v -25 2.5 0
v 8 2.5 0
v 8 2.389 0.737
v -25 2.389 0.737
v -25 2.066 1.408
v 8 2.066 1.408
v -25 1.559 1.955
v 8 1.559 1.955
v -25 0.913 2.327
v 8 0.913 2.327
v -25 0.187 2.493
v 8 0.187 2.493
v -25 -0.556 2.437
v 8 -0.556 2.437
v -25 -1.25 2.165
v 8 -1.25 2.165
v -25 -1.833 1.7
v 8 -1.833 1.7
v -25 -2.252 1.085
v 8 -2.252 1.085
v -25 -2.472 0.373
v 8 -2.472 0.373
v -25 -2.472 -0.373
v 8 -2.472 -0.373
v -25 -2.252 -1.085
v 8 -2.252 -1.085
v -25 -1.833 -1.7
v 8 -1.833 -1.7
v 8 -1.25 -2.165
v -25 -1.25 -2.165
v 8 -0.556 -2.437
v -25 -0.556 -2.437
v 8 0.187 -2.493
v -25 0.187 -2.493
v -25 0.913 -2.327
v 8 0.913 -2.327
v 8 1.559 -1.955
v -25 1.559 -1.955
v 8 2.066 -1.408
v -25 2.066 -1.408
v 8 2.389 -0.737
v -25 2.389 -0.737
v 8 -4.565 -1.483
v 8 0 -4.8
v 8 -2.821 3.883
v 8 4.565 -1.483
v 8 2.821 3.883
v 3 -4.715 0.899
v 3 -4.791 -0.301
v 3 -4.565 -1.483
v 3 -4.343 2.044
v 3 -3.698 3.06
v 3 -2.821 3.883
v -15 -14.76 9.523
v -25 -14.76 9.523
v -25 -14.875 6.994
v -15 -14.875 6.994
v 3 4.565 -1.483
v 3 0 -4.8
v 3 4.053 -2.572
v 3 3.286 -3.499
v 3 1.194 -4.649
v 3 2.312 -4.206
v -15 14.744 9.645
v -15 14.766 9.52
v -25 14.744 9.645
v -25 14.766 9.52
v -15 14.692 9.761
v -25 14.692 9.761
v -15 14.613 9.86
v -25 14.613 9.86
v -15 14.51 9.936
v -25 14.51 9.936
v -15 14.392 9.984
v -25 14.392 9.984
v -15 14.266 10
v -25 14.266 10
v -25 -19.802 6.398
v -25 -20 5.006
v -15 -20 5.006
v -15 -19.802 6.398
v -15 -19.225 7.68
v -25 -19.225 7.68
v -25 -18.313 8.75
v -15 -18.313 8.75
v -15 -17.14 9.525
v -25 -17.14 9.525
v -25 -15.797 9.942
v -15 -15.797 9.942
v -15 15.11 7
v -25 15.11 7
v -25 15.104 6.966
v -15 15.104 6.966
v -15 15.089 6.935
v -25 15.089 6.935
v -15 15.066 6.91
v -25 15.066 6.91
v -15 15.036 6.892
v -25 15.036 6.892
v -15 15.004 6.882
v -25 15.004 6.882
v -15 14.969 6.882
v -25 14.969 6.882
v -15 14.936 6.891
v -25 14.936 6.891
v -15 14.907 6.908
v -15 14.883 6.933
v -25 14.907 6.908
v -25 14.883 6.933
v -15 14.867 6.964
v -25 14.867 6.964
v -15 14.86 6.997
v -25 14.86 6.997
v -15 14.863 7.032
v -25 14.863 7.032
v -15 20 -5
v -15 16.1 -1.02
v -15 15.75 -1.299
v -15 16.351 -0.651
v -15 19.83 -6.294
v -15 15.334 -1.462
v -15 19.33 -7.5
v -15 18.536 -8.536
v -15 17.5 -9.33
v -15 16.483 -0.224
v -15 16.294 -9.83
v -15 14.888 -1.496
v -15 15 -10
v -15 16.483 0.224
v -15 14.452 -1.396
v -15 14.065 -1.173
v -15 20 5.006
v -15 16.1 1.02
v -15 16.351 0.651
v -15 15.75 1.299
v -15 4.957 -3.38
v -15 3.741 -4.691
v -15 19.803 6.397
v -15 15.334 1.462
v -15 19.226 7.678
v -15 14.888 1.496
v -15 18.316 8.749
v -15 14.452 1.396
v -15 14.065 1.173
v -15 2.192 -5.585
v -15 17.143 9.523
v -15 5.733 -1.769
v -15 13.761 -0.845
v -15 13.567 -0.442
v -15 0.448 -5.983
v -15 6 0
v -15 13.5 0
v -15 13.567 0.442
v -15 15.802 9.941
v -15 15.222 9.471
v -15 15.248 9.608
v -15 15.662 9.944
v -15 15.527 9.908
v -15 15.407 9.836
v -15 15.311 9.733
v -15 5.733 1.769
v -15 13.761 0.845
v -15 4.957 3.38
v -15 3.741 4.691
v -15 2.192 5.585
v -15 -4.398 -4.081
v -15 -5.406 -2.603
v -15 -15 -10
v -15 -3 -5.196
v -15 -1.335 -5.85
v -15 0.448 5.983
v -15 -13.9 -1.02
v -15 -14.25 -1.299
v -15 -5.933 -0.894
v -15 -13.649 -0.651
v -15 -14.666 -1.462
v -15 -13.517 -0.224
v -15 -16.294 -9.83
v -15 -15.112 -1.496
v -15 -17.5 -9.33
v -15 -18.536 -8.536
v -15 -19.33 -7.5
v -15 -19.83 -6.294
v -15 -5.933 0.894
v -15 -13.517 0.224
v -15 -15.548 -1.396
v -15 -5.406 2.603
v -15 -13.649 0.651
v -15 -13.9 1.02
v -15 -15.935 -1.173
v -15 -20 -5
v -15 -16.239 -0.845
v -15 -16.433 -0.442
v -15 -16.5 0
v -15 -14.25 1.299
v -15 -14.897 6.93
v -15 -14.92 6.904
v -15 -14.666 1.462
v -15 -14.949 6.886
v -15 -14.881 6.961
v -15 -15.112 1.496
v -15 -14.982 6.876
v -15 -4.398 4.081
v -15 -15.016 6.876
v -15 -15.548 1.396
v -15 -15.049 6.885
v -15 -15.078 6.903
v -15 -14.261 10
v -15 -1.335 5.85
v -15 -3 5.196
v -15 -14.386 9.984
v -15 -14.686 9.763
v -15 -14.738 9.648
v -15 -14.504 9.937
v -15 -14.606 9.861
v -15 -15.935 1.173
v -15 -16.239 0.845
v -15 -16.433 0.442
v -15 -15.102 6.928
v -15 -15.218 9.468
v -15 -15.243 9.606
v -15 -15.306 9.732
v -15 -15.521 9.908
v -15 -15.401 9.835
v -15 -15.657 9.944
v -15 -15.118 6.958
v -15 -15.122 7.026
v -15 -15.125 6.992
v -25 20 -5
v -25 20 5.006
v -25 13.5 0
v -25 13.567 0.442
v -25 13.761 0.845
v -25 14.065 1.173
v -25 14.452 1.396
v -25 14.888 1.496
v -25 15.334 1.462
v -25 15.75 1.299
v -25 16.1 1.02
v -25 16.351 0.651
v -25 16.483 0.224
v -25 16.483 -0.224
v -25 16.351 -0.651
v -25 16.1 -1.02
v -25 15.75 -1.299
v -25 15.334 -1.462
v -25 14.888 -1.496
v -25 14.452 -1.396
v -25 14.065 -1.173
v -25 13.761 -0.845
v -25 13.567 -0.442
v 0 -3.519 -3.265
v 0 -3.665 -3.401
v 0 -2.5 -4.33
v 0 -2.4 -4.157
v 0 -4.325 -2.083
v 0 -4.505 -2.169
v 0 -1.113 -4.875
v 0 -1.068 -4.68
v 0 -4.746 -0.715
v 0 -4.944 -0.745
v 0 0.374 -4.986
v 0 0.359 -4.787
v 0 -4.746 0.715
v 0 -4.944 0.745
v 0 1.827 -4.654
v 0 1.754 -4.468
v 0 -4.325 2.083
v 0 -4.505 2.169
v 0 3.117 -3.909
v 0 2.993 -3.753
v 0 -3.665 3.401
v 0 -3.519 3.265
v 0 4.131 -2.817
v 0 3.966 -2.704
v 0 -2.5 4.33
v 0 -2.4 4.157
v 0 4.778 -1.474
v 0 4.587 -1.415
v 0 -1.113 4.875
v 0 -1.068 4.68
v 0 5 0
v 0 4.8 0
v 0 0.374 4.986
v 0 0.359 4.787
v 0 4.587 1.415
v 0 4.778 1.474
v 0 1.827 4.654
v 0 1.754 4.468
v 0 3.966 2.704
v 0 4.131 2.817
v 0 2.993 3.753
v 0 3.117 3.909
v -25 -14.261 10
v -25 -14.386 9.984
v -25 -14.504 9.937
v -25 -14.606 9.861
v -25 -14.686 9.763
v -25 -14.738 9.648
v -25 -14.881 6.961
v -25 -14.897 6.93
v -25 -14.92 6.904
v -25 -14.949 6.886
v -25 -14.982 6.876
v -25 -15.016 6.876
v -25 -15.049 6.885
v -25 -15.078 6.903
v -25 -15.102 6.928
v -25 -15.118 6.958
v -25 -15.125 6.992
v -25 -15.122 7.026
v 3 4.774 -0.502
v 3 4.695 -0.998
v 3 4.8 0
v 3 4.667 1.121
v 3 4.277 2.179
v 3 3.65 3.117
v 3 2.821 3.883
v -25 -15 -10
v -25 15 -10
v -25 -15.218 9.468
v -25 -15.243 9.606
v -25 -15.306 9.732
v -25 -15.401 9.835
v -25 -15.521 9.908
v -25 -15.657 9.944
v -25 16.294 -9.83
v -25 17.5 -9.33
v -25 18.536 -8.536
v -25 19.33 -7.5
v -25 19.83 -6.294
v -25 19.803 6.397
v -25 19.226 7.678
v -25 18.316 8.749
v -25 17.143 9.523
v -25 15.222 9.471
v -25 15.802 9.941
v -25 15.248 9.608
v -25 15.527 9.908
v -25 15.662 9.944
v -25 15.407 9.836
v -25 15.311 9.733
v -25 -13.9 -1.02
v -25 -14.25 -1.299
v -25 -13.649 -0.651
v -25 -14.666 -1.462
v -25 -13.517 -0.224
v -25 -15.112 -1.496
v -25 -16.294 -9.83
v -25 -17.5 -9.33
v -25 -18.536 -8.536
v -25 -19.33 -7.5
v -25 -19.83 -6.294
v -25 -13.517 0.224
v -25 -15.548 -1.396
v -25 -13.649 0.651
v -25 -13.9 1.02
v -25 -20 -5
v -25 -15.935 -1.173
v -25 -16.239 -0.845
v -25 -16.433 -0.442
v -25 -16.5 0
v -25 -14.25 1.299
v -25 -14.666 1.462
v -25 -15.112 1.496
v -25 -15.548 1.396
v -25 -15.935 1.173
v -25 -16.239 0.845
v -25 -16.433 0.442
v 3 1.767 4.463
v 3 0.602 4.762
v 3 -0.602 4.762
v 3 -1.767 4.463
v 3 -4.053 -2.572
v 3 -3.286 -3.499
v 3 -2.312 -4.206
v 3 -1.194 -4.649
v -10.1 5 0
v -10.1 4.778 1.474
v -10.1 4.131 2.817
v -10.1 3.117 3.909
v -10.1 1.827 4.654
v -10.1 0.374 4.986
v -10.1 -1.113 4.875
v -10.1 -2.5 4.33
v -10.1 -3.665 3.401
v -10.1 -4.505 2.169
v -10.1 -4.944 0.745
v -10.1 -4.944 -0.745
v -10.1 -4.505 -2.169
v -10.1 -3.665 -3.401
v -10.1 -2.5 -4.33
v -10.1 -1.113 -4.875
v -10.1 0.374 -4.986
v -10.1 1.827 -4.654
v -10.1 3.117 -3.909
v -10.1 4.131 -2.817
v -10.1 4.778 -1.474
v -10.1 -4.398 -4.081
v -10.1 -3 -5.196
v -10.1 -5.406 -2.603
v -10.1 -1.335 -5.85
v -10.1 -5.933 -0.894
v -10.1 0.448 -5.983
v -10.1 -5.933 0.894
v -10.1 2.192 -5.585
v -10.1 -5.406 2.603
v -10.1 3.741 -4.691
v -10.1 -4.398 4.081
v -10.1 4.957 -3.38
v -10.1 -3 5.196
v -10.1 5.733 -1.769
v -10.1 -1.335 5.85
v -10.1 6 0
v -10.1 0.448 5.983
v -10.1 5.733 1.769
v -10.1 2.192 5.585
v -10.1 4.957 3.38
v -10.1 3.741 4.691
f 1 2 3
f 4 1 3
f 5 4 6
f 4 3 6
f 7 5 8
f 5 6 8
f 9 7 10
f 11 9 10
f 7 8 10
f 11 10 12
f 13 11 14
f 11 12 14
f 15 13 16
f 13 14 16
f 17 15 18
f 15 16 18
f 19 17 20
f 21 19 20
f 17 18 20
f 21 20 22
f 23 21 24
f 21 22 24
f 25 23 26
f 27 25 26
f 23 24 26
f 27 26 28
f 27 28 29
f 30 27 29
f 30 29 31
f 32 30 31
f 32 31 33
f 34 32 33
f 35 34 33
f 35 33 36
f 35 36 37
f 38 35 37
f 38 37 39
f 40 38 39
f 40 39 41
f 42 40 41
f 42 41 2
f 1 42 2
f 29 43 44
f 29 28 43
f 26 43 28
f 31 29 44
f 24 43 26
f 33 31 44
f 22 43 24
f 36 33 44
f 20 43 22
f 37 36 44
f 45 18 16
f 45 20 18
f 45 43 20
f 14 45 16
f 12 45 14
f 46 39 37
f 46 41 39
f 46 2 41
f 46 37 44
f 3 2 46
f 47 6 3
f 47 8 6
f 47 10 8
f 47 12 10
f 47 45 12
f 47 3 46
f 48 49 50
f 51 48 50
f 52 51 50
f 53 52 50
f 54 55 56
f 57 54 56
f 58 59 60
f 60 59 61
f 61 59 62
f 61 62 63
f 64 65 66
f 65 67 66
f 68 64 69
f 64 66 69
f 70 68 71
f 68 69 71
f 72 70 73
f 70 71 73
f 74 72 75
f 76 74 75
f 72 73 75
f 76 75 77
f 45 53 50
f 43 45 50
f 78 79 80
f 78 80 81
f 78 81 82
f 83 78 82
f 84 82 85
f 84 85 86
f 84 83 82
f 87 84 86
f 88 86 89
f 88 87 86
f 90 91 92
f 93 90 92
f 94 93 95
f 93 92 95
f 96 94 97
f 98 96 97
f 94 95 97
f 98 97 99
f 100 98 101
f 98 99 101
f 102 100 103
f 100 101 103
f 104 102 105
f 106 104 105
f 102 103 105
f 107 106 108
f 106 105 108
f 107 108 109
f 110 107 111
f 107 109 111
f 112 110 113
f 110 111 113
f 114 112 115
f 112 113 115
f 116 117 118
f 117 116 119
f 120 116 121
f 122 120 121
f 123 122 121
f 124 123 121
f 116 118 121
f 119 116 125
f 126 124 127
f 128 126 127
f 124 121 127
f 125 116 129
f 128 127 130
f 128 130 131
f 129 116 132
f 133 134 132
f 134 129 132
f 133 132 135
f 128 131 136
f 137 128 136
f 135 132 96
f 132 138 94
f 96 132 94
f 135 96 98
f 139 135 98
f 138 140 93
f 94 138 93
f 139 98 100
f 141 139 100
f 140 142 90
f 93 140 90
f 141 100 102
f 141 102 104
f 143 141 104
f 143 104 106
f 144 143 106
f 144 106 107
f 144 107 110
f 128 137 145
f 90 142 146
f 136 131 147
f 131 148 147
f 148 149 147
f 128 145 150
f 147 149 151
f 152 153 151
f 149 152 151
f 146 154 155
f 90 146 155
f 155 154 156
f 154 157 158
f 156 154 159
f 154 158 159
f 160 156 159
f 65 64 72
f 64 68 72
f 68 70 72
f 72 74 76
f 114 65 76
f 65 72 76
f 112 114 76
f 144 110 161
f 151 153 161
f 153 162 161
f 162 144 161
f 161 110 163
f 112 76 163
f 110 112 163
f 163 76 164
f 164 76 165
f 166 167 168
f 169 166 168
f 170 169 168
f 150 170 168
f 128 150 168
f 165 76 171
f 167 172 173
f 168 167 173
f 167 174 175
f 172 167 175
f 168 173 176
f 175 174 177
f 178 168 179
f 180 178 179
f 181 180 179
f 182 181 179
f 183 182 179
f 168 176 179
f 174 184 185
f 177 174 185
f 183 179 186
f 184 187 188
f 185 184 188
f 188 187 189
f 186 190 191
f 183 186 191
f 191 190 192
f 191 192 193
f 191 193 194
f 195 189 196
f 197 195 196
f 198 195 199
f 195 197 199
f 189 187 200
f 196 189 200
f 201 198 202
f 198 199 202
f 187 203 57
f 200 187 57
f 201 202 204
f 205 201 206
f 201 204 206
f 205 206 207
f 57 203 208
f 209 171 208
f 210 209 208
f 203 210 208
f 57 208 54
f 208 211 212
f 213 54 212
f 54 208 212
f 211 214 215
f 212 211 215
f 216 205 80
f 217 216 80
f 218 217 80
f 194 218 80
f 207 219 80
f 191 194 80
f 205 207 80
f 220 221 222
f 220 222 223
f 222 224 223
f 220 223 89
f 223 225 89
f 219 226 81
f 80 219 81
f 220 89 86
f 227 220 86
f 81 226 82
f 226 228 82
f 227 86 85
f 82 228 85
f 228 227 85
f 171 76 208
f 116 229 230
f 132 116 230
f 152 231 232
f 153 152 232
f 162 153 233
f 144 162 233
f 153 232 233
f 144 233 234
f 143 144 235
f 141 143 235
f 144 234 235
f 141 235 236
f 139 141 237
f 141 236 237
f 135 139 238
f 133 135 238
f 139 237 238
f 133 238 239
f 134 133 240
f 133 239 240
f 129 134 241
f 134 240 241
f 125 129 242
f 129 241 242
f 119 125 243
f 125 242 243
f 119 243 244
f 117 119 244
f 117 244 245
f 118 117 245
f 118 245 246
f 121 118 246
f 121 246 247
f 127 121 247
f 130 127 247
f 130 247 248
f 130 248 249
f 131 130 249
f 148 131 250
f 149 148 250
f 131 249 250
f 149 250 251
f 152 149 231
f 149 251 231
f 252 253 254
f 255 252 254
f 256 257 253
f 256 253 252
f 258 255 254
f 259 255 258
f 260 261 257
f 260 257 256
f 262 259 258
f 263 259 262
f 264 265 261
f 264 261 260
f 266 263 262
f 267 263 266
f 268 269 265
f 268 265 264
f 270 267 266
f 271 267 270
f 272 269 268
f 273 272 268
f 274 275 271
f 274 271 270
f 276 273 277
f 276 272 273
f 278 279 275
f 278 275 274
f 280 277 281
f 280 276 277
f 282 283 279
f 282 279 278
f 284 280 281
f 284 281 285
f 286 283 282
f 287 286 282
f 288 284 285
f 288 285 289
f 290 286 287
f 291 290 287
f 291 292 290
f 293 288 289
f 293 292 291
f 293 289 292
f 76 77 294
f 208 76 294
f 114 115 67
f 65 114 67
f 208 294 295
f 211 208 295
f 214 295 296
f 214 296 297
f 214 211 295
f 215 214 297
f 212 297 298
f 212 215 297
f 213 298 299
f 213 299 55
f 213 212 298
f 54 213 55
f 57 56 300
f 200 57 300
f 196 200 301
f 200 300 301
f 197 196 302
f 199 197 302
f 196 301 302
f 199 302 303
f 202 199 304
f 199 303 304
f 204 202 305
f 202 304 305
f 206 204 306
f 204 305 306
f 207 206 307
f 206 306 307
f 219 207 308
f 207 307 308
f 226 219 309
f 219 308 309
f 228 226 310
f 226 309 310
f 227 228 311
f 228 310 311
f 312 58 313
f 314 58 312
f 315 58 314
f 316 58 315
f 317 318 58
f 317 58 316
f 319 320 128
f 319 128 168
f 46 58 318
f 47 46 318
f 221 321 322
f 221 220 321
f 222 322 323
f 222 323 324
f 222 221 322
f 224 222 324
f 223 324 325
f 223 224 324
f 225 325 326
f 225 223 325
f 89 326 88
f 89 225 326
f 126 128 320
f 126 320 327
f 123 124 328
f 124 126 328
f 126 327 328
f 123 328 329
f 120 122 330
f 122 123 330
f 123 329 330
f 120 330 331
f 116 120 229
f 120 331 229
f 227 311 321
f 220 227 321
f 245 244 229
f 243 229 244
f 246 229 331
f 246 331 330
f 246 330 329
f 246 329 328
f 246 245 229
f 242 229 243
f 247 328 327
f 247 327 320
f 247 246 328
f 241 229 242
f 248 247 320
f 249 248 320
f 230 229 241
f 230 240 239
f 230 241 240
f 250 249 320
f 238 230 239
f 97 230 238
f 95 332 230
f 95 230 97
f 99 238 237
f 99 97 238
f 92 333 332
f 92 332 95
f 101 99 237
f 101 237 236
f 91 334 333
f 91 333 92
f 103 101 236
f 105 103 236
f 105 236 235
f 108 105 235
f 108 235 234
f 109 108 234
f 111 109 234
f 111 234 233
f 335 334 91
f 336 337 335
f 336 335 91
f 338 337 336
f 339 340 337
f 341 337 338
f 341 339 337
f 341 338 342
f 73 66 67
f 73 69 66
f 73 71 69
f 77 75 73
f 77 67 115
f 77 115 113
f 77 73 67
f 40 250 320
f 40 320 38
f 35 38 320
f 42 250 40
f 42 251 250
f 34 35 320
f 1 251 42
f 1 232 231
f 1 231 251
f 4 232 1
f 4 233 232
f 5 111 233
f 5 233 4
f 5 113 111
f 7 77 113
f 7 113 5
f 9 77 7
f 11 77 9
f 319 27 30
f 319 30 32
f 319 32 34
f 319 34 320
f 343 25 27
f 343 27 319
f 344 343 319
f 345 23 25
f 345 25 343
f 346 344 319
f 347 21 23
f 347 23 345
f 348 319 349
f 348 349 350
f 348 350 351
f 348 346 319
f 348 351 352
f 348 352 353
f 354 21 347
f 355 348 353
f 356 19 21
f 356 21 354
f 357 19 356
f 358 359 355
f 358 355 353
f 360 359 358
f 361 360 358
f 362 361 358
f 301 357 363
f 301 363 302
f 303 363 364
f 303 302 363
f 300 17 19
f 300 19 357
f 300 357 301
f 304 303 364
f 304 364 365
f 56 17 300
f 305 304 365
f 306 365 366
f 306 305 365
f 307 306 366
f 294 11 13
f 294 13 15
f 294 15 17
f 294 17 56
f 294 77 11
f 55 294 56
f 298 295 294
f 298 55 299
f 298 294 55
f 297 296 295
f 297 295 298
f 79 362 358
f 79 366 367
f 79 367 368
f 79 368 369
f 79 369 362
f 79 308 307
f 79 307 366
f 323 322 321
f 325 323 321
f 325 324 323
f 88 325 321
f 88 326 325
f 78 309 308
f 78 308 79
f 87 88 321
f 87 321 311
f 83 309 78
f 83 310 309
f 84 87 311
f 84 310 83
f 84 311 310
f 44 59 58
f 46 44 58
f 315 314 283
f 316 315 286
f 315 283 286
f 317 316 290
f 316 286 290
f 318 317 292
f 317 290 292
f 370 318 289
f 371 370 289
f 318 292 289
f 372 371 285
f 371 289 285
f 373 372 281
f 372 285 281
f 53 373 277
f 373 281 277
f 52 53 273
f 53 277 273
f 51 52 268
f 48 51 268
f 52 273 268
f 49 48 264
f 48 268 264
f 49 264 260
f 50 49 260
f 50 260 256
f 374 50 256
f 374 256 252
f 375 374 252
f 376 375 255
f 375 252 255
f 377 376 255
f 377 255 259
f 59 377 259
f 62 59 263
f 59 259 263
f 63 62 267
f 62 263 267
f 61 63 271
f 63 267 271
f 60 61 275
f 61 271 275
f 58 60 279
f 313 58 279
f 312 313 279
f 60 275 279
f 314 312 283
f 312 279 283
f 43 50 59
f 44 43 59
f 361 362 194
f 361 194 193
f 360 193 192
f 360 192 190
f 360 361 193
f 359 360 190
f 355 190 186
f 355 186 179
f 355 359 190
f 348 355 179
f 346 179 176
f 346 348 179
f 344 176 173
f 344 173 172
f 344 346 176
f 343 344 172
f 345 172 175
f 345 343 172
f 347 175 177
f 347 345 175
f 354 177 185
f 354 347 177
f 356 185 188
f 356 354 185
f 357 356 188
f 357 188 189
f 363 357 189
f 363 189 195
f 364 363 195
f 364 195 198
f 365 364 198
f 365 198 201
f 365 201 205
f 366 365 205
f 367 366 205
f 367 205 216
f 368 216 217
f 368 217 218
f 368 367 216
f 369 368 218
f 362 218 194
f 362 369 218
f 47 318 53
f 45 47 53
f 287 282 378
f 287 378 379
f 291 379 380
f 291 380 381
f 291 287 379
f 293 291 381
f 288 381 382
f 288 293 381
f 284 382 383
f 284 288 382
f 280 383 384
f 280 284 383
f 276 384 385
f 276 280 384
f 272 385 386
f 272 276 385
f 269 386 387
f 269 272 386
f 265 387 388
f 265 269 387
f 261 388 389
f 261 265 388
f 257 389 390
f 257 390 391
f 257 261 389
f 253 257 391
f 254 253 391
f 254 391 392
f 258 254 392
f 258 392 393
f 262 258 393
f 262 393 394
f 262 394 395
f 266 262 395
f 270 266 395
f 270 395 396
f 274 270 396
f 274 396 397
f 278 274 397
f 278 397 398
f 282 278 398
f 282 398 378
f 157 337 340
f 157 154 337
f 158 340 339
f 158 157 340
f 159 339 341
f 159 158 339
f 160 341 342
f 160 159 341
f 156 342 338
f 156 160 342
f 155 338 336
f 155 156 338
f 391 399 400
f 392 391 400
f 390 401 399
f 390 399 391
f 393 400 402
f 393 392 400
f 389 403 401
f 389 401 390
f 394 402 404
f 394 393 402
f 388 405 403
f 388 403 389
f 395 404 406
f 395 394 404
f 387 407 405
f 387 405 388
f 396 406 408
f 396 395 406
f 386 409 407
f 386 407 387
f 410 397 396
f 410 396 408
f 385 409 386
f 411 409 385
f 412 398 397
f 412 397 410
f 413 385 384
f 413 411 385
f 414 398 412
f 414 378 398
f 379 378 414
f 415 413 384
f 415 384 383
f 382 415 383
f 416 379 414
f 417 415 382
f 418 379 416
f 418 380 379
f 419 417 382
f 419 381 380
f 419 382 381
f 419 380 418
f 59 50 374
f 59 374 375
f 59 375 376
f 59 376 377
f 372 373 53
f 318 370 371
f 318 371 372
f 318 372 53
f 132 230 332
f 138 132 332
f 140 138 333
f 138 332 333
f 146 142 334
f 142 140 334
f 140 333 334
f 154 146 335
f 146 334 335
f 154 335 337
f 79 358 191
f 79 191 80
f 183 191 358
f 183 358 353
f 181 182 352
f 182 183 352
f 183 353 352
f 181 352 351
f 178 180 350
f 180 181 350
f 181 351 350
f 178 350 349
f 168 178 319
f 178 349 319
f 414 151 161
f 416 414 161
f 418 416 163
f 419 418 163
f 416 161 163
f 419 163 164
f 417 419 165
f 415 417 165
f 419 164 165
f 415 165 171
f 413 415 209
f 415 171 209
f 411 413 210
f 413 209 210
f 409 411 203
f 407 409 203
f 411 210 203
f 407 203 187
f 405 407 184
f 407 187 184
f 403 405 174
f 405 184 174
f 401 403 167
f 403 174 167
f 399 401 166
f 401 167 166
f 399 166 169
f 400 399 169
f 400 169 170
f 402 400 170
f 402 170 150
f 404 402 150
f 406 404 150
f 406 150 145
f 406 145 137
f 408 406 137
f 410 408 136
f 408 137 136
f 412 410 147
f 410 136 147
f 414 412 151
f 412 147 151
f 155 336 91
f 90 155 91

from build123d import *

# Parameters (mm, degrees)
F0_R          = 5
F1_DEPTH      = 25
F2_R          = 4.8
F3_DEPTH      = 3
F5_DEPTH      = 5
F5_DEPTH_BACK = 23
F6_W          = 40
F6_H          = 20
F6_R          = 1.5
F7_DEPTH      = 10
F9_DEPTH      = 10
F10_T1_DEPTH  = 34.9696394511
F10_T3_DEPTH  = 35
F10_T5_DEPTH  = 34.9715357564
F11_R         = 0.5
F12_R         = 6
F13_DEPTH     = 4.9
F14_R         = 2.5
F15_DEPTH     = 65


# Not quite as in the source:
# - a fillet or chamfer that OpenCascade refuses, or shapes differently, is made with other operations: its cross-section is extruded or revolved along the edge and cut away or added
# - a feature names something its author has since deleted; it is built from what else it names


with BuildPart() as f1:
    # F0 (on Right) → F1 (new body)
    with BuildSketch(Plane.YZ):
        Circle(F0_R)
    extrude(amount=-F1_DEPTH)

    # F2 (on face) → F3 (join)
    with BuildSketch(Plane.YZ):
        Circle(F2_R)
    extrude(amount=F3_DEPTH)

    # F4 (on face) → F5 (join, two sides)
    with BuildSketch(Plane.YZ.offset(3)) as f5_sk:
        Polygon((-4.5650712782, -1.483281573), (0, -4.8), (4.5650712782, -1.483281573), (2.821369211, 3.883281573), (-2.821369211, 3.883281573), align=None)
    extrude(amount=F5_DEPTH)
    extrude(f5_sk.sketch, amount=-F5_DEPTH_BACK)

    # F6 (on face) → F7 (join)
    with BuildSketch(Plane(origin=(-25, 0, 0), x_dir=(0, -1, 0), z_dir=(-1, 0, 0))):
        Rectangle(F6_W, F6_H)
        with Locations((-15, 0)):
            Circle(F6_R, mode=Mode.SUBTRACT)
        with BuildLine():
            ThreePointArc((13.5, 0), (15, 1.5), (16.5, 0))
            ThreePointArc((16.5, 0), (15, -1.5), (13.5, 0))
        make_face(mode=Mode.SUBTRACT)
    extrude(amount=-F7_DEPTH)

    # F8 (on face) → F9 (cut)
    with BuildSketch(Plane(origin=(-25, 0, 0), x_dir=(0, -1, 0), z_dir=(-1, 0, 0))):
        with BuildLine():
            Line((15.0452693954, 10), (14.9885289893, 10))
            Line((14.9885289893, 10), (14.7385289893, 10))
            Line((14.7385289893, 10), (14.8751285557, 6.9943249556))
            ThreePointArc((14.8751285557, 6.9943249556), (15.0159151334, 6.8760173486), (15.1222554927, 7.0260482732))
            Line((15.1222554927, 7.0260482732), (15.2385289893, 10))
            Line((15.2385289893, 10), (15.0452693954, 10))
        make_face()
        with BuildLine():
            Line((-14.9398591969, 10.0056750444), (-14.9965996031, 10.0056750444))
            Line((-14.9965996031, 10.0056750444), (-15.2465996031, 10.0056750444))
            Line((-15.2465996031, 10.0056750444), (-15.1100000367, 7))
            ThreePointArc((-15.1100000367, 7), (-14.9692134589, 6.881692393), (-14.8628730997, 7.0317233176))
            Line((-14.8628730997, 7.0317233176), (-14.7465996031, 10.0056750444))
            Line((-14.7465996031, 10.0056750444), (-14.9398591969, 10.0056750444))
        make_face()
    extrude(amount=-F9_DEPTH, mode=Mode.SUBTRACT)

    # F10: fillet of radius 5 on 4 edges, made by hand

    # F10_s2 → F10_t1 (cut)
    with BuildSketch(Plane.YZ.offset(-37.4848197255)):
        with BuildLine():
            ThreePointArc((20, 5.0060721098), (18.6215817291, 8.4534110516), (15.2463416881, 10))
            Line((15.2463416881, 10), (20, 10))
            Line((20, 10), (20, 5.0060721098))
        make_face()
    extrude(amount=F10_T1_DEPTH, mode=Mode.SUBTRACT)

    # F10_s4 → F10_t3 (cut)
    with BuildSketch(Plane.YZ.offset(-37.5)):
        with BuildLine():
            ThreePointArc((15, -10), (18.5355339059, -8.5355339059), (20, -5))
            Line((20, -5), (20, -10))
            Line((20, -10), (15, -10))
        make_face()
        with BuildLine():
            ThreePointArc((-20, -5), (-18.5355339059, -8.5355339059), (-15, -10))
            Line((-15, -10), (-20, -10))
            Line((-20, -10), (-20, -5))
        make_face()
    extrude(amount=F10_T3_DEPTH, mode=Mode.SUBTRACT)

    # F10_s6 → F10_t5 (cut)
    with BuildSketch(Plane.YZ.offset(-37.4857678782)):
        with BuildLine():
            ThreePointArc((-20, 5.0056928487), (-18.6188841475, 8.4558635006), (-15.2385289893, 10))
            Line((-15.2385289893, 10), (-20, 10))
            Line((-20, 10), (-20, 5.0056928487))
        make_face()
    extrude(amount=F10_T5_DEPTH, mode=Mode.SUBTRACT)

    # F11
    f11_edges = [f1.edges().sort_by_distance(p)[0] for p in [
        (-20, -14.738529, 10),
        (-20, 14.746821, 10),
        (-20, 15.246342, 10),
        (-20, -15.238529, 10),
    ]]
    fillet(f11_edges, radius=F11_R)

    # F12 (on face) → F13 (join)
    with BuildSketch(Plane.YZ.offset(-15)):
        Circle(F12_R)
    extrude(amount=F13_DEPTH)

    # F14 (on face) → F15 (cut)
    with BuildSketch(Plane.YZ.offset(8)):
        Circle(F14_R)
    extrude(amount=-F15_DEPTH, mode=Mode.SUBTRACT)


solid = f1.part
